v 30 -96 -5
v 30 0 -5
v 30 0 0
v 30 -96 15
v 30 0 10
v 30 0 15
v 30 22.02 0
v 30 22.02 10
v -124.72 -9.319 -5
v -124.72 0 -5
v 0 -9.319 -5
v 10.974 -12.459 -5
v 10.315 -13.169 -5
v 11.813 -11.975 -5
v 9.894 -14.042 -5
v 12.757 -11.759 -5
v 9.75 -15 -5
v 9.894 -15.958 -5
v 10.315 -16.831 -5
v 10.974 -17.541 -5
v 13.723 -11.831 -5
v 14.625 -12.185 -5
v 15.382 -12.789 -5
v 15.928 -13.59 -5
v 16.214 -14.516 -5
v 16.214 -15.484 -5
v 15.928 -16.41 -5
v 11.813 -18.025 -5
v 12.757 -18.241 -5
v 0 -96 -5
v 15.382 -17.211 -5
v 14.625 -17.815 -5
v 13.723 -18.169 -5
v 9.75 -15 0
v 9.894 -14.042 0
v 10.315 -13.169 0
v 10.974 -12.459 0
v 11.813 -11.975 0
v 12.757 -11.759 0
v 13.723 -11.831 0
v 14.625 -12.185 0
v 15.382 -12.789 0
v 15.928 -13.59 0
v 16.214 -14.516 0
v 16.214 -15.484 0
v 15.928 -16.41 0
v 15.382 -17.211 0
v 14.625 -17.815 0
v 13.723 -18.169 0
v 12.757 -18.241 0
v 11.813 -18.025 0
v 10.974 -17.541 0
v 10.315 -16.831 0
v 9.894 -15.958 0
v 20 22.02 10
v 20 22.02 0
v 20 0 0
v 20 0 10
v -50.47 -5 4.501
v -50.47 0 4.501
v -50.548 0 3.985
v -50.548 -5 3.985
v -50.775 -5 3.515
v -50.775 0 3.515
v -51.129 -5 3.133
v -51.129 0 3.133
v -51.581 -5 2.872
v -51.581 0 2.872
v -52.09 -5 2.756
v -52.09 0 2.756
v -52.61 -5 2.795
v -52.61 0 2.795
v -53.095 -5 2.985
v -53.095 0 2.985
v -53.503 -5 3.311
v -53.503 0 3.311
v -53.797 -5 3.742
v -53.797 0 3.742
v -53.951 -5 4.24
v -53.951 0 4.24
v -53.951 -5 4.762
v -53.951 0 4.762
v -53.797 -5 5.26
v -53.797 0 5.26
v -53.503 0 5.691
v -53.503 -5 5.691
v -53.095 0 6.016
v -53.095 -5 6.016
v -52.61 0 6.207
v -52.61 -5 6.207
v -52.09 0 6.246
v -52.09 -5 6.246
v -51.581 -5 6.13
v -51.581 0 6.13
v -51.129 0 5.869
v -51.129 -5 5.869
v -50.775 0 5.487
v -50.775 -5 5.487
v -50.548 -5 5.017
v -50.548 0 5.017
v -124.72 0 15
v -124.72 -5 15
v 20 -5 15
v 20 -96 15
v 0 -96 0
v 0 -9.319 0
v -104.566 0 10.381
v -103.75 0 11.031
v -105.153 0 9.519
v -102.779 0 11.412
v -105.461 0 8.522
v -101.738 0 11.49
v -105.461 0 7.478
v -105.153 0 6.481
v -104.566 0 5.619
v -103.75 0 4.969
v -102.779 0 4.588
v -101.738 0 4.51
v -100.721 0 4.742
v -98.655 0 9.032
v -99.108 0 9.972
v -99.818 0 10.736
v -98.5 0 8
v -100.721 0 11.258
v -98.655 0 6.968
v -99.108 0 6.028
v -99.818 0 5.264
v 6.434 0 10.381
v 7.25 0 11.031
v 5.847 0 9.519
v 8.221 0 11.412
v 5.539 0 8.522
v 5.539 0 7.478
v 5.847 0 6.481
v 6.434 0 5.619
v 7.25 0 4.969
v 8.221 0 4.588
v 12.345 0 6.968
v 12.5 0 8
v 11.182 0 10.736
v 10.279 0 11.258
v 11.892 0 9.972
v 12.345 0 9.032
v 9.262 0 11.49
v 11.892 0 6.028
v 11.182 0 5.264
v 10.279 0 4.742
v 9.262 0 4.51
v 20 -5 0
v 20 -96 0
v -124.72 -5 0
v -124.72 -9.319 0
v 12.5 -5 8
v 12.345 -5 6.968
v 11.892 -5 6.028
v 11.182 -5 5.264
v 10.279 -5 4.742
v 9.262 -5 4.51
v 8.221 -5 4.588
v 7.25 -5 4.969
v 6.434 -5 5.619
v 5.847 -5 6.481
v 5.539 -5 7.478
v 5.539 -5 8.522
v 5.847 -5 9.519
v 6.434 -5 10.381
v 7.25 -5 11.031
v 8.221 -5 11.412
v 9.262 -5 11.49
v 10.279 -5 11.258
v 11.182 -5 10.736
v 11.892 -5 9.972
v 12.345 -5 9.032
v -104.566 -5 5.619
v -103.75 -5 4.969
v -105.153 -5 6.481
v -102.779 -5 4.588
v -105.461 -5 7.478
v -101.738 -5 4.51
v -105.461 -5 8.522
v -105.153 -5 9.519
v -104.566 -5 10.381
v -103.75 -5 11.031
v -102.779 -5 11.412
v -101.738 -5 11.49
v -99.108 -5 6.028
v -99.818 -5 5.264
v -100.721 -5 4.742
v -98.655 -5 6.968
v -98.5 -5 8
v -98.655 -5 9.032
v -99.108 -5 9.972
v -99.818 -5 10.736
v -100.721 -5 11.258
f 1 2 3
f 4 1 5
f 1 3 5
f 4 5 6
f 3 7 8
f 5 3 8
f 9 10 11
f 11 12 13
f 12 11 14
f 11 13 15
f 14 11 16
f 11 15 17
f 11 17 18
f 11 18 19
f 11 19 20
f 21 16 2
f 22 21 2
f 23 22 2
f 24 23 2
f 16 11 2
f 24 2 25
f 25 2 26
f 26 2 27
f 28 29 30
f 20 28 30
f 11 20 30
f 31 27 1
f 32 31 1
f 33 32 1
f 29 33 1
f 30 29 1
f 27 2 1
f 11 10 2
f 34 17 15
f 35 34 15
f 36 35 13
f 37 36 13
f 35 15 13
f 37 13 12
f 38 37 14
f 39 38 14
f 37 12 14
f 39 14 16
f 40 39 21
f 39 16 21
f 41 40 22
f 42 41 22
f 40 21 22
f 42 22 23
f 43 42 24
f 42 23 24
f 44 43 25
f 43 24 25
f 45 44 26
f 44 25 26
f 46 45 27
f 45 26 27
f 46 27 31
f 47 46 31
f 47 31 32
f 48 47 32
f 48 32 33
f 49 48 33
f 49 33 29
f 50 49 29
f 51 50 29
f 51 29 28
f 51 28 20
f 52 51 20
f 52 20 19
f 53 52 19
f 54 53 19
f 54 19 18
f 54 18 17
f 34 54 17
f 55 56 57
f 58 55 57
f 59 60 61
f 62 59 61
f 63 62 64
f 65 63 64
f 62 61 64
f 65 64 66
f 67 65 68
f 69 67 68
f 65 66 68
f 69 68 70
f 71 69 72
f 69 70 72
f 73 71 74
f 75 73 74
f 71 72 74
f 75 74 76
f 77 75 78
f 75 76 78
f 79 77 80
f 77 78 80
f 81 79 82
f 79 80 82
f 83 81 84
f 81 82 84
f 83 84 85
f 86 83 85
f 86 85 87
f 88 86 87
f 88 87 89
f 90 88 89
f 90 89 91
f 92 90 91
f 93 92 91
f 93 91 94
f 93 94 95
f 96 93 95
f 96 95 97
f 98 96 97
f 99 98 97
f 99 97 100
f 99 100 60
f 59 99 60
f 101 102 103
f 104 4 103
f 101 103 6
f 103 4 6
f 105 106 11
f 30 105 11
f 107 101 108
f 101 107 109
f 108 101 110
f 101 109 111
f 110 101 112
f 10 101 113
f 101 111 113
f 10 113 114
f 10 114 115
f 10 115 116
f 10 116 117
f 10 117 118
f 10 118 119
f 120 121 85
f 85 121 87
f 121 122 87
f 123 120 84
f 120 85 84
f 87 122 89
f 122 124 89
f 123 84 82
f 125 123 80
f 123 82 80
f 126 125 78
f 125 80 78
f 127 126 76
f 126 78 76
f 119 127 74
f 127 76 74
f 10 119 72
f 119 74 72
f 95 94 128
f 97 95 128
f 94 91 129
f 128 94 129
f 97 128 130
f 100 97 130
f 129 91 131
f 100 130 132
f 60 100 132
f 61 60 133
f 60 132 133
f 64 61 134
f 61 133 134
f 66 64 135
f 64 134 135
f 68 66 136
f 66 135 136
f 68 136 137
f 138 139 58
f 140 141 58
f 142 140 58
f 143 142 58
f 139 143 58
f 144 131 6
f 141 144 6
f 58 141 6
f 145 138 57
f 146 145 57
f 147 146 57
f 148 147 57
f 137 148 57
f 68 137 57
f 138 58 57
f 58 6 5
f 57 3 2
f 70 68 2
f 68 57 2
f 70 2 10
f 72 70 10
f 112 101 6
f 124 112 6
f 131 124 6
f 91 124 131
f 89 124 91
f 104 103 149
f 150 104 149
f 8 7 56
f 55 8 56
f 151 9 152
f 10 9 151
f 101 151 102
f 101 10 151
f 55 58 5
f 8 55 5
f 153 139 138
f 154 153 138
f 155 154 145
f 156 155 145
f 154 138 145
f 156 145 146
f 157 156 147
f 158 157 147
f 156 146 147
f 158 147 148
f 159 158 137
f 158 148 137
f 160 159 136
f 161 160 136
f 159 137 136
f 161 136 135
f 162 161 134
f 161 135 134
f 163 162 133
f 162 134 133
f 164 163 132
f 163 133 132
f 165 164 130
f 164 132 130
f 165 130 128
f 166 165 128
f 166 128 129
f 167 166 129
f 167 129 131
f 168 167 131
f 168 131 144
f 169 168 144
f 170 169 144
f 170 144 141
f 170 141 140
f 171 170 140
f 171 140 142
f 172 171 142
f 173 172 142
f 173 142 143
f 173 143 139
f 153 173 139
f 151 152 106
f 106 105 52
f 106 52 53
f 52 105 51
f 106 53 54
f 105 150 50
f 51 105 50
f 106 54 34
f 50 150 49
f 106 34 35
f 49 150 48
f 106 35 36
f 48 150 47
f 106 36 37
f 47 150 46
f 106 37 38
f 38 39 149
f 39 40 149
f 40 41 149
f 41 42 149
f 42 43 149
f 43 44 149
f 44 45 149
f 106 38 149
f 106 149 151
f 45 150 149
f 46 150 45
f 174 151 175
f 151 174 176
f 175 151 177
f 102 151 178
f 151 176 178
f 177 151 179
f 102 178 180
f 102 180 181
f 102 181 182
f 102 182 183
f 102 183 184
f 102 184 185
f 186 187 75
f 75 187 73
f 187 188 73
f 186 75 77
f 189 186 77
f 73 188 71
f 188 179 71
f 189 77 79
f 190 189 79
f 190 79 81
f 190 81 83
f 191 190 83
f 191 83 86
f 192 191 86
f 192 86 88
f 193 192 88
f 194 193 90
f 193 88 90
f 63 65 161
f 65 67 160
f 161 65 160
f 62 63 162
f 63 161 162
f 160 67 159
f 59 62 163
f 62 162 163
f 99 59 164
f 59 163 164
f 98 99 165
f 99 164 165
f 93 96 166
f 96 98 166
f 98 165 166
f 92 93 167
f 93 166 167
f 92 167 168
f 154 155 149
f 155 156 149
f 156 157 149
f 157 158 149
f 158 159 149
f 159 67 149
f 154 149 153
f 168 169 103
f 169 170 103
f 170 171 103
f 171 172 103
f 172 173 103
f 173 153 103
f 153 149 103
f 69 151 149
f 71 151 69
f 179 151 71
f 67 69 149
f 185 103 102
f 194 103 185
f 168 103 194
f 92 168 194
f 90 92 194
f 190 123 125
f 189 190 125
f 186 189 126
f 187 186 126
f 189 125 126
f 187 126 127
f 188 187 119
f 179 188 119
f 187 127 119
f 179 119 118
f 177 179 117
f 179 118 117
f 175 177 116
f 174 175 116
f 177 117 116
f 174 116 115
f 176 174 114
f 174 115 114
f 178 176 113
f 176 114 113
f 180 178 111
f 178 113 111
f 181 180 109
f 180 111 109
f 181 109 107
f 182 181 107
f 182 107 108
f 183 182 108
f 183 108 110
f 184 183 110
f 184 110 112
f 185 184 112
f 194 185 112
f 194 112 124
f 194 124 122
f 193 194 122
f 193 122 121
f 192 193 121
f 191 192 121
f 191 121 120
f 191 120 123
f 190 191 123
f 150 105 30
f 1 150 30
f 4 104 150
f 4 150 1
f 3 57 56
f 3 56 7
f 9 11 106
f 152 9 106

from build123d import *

# Parameters (mm, degrees)
BOSS_EXTRUDE3_DEPTH     = 10
SKETCH4_W               = 30
SKETCH4_H               = 25
BOSS_EXTRUDE4_DEPTH     = 5
BOSS_EXTRUDE5_DEPTH     = 5
BOSS_EXTRUDE6_DEPTH     = 71
BOSS_EXTRUDE7_DEPTH     = 124.720470612
SKETCH9_R               = 3.25
CUT_EXTRUDE1_DEPTH      = 15
SKETCH13_R              = 1.75
CUT_EXTRUDE2_DEPTH      = 8
CUT_EXTRUDE2_DEPTH_BACK = 10
SKETCH14_R              = 3.5
CUT_EXTRUDE3_DEPTH      = 8
CUT_EXTRUDE3_DEPTH_BACK = 12
SKETCH15_R              = 3.5
CUT_EXTRUDE4_DEPTH      = 4
CUT_EXTRUDE4_DEPTH_BACK = 17


with BuildPart() as part:
    # Sketch3 → Boss-Extrude3 (new body)
    with BuildSketch(Plane.XY):
        Polygon((0, 0), (0, -5), (20, -5), (20, -25), (30, -25), (30, 22.02), (20, 22.02), (20, 0), align=None)
    extrude(amount=BOSS_EXTRUDE3_DEPTH)

    # Sketch4 → Boss-Extrude4 (add)
    with BuildSketch(Plane(origin=(0, 0, 0), x_dir=(-1, 0, 0), z_dir=(0, 0, -1))):
        with Locations((-15, -12.5)):
            Rectangle(SKETCH4_W, SKETCH4_H)
    extrude(amount=BOSS_EXTRUDE4_DEPTH)

    # Sketch5 → Boss-Extrude5 (add)
    with BuildSketch(Plane.XY.offset(10)):
        Polygon((0, 0), (0, -5), (20, -5), (20, -25), (30, -25), (30, 0), align=None)
    extrude(amount=BOSS_EXTRUDE5_DEPTH)

    # Sketch6 → Boss-Extrude6 (add)
    with BuildSketch(Plane.XZ.offset(25)):
        Polygon((20, 15), (20, 0), (0, 0), (0, -5), (30, -5), (30, 15), align=None)
    extrude(amount=BOSS_EXTRUDE6_DEPTH)

    # Sketch7 → Boss-Extrude7 (add)
    with BuildSketch(Plane.ZY):
        Polygon((15, -5), (15, 0), (0, 0), (-5, 0), (-5, -5), (-5, -9.319004474), (0, -9.319004474), (0, -5), align=None)
    extrude(amount=BOSS_EXTRUDE7_DEPTH)

    # Sketch9 → Cut-Extrude1 (cut)
    with BuildSketch(Plane(origin=(0, 0, -5), x_dir=(-1, 0, 0), z_dir=(0, 0, -1))):
        with Locations((-13, -15)):
            Circle(SKETCH9_R)
    extrude(amount=-CUT_EXTRUDE1_DEPTH, mode=Mode.SUBTRACT)

    # Sketch13 → Cut-Extrude2 (cut, two sides)
    with BuildSketch(Plane(origin=(0, 0, 0), x_dir=(1, 0, 0), z_dir=(0, 1, 0))) as cut_extrude2_sk:
        with Locations((-52.220470612, -4.500931244)):
            Circle(SKETCH13_R)
    extrude(amount=CUT_EXTRUDE2_DEPTH, mode=Mode.SUBTRACT)
    extrude(cut_extrude2_sk.sketch, amount=-CUT_EXTRUDE2_DEPTH_BACK, mode=Mode.SUBTRACT)

    # Sketch14 → Cut-Extrude3 (cut, two sides)
    with BuildSketch(Plane(origin=(0, 0, 0), x_dir=(1, 0, 0), z_dir=(0, 1, 0))) as cut_extrude3_sk:
        with Locations((-102, -8)):
            Circle(SKETCH14_R)
    extrude(amount=CUT_EXTRUDE3_DEPTH, mode=Mode.SUBTRACT)
    extrude(cut_extrude3_sk.sketch, amount=-CUT_EXTRUDE3_DEPTH_BACK, mode=Mode.SUBTRACT)

    # Sketch15 → Cut-Extrude4 (cut, two sides)
    with BuildSketch(Plane(origin=(0, 0, 0), x_dir=(1, 0, 0), z_dir=(0, 1, 0))) as cut_extrude4_sk:
        with Locations((9, -8)):
            Circle(SKETCH15_R)
    extrude(amount=CUT_EXTRUDE4_DEPTH, mode=Mode.SUBTRACT)
    extrude(cut_extrude4_sk.sketch, amount=-CUT_EXTRUDE4_DEPTH_BACK, mode=Mode.SUBTRACT)


solid = part.part
